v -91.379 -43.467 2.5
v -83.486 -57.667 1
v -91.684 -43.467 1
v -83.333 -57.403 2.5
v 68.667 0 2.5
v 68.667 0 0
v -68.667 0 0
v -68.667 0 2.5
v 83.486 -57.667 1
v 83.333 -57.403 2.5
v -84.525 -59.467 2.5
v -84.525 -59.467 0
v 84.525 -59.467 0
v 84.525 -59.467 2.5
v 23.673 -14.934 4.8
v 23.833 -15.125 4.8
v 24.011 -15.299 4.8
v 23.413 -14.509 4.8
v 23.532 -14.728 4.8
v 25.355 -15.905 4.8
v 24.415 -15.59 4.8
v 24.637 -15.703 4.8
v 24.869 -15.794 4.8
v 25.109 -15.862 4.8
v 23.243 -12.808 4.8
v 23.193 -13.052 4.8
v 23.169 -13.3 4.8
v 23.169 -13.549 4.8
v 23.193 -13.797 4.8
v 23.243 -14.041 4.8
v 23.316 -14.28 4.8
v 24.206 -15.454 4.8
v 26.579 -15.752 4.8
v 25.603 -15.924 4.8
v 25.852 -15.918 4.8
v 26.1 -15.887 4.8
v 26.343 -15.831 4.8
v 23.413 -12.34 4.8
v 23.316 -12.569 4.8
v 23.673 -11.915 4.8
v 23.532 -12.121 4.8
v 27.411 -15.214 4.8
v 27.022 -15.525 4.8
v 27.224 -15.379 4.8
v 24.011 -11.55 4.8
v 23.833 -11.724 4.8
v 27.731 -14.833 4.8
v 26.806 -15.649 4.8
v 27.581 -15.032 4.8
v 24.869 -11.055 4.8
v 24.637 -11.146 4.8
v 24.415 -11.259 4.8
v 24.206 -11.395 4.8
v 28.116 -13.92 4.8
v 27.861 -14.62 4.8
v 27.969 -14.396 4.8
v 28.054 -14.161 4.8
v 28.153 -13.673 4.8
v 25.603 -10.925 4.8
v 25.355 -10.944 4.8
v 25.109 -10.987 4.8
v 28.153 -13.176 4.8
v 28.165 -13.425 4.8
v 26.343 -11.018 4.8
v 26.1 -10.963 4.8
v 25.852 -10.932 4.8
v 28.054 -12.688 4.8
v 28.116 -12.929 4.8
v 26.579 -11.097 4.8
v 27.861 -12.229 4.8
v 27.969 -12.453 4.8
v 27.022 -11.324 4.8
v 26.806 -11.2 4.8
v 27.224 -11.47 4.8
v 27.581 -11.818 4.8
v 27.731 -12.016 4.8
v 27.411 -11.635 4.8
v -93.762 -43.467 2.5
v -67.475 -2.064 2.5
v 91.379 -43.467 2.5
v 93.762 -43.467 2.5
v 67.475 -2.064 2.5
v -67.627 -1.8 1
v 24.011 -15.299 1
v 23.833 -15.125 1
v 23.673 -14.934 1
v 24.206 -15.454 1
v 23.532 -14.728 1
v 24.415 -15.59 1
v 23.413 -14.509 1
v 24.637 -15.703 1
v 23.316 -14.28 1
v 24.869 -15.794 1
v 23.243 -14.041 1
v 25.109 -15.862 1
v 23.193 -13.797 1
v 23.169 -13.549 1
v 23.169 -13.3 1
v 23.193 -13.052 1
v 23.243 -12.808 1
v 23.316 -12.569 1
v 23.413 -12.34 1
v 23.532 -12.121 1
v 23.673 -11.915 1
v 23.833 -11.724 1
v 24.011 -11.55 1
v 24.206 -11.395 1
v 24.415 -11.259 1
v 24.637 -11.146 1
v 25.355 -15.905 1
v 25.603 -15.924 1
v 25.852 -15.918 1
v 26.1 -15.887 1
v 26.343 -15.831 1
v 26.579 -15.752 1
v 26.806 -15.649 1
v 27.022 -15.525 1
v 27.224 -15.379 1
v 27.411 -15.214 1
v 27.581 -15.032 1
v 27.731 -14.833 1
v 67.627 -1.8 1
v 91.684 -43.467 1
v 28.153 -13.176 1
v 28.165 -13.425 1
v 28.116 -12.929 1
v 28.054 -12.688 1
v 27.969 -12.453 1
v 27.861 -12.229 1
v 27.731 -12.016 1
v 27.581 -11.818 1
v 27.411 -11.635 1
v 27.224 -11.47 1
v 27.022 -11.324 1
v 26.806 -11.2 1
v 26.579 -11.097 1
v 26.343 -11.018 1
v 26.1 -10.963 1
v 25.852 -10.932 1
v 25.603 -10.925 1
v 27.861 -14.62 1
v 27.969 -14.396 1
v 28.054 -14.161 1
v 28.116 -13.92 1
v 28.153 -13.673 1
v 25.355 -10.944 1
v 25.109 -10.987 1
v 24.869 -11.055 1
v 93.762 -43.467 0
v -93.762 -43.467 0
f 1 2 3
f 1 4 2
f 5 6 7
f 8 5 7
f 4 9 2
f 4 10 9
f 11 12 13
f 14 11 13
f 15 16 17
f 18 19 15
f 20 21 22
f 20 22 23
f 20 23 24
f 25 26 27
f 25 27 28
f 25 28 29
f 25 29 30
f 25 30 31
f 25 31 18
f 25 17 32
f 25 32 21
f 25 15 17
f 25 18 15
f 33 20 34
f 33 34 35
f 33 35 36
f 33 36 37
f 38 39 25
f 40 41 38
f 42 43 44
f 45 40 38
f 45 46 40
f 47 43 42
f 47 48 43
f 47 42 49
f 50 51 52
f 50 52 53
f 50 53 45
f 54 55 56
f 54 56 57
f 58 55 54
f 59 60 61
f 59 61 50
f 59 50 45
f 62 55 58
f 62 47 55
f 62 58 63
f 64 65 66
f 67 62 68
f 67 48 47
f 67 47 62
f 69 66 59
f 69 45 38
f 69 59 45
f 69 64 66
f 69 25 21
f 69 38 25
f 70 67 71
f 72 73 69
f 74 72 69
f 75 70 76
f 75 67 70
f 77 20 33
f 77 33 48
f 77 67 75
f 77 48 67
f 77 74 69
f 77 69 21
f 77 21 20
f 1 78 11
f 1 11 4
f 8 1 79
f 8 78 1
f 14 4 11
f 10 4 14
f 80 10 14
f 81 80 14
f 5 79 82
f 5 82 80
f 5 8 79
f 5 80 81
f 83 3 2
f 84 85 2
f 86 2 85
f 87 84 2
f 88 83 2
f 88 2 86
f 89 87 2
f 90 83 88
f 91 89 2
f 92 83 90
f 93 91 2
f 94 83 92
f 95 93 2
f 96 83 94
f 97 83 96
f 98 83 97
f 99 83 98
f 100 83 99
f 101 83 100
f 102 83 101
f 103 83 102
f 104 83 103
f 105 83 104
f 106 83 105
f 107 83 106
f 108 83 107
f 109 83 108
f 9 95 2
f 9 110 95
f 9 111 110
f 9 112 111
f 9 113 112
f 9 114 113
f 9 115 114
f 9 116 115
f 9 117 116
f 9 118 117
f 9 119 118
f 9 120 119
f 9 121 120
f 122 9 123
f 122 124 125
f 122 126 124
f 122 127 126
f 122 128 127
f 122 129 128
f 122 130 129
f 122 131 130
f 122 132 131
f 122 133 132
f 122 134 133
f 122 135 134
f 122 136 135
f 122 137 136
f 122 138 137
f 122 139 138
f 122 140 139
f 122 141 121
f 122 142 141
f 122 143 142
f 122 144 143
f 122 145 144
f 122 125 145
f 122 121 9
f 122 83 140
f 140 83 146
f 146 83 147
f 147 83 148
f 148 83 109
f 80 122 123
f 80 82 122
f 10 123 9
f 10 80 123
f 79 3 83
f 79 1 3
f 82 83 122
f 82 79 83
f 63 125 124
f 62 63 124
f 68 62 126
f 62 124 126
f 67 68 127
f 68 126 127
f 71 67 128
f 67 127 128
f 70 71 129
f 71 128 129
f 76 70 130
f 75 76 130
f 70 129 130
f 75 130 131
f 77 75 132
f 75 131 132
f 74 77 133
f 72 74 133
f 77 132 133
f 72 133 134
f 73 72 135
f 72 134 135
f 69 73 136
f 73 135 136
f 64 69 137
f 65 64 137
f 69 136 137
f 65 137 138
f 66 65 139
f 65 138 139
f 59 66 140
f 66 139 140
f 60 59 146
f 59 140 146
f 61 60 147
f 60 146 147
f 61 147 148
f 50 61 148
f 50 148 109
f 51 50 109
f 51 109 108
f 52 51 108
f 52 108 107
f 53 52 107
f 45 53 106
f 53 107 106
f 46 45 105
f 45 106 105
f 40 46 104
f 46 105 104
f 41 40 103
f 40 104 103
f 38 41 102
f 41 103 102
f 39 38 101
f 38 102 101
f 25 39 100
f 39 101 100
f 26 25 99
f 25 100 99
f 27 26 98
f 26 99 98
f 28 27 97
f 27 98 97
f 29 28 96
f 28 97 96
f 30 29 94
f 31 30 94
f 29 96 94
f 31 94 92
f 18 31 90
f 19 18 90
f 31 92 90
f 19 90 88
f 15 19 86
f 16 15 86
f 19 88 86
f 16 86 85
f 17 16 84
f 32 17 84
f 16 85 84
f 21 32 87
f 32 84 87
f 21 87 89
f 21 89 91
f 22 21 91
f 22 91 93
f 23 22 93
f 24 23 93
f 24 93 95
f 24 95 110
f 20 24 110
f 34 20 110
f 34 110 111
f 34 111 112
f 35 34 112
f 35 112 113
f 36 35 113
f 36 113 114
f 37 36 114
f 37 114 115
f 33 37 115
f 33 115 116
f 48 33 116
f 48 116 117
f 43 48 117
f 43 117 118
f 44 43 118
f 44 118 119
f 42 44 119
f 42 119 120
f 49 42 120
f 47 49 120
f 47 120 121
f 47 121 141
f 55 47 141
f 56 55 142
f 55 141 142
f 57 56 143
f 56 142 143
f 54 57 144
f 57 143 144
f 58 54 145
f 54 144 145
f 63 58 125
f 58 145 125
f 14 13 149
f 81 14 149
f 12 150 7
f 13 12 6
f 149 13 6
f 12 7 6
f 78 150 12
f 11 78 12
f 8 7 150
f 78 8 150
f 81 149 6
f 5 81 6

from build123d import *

# Parameters (mm, degrees)
BOSS_EXTRU_1_DEPTH              = 1
EXTRU_MINCE1_DEPTH              = 1.5
EXTRU_MINCE1_TAPER              = -10
ENL_V_DE_MAT_EXTRU_MINCE1_DEPTH = 3.5000001
ESQUISSE4_R                     = 2.5
BOSS_EXTRU_2_DEPTH              = 3.8


with BuildPart() as part:
    # Esquisse1 → Boss.-Extru.1 (new body)
    with BuildSketch(Plane.XY):
        Polygon((-84.524791386, -59.467077727), (2.7, -59.467077727), (84.524791386, -59.467077727), (93.762395693, -43.467077727), (68.666666667, 0), (-68.666666667, 0), (-93.762395693, -43.467077727), align=None)
    extrude(amount=BOSS_EXTRU_1_DEPTH)

    # Esquisse2 → Extru.-Mince1 (add)
    with BuildSketch(Plane.XY.offset(1)):
        Polygon((-93.762395693, -43.467077727), (-84.524791386, -59.467077727), (84.524791386, -59.467077727), (93.762395693, -43.467077727), (68.666666667, 0), (-68.666666667, 0), align=None)
        Polygon((-91.683934724, -43.467077727), (-83.485560901, -57.667077727), (83.485560901, -57.667077727), (91.683934724, -43.467077727), (67.627436182, -1.8), (-67.627436182, -1.8), align=None, mode=Mode.SUBTRACT)
    extrude(amount=EXTRU_MINCE1_DEPTH, taper=EXTRU_MINCE1_TAPER)

    # Esquisse3 → Enlèv. de mat.-Extru.-Mince1 (cut, through all)
    with BuildSketch(Plane(origin=(0, 0, 0), x_dir=(-1, 0, 0), z_dir=(0, 0, -1))):
        Polygon((85.621756897, -61.367077727), (95.956326716, -43.467077727), (69.763632178, 1.9), (-69.763632178, 1.9), (-95.956326716, -43.467077727), (-85.621756897, -61.367077727), align=None)
        Polygon((84.524791386, -59.467077727), (93.762395693, -43.467077727), (68.666666667, 0), (-68.666666667, 0), (-93.762395693, -43.467077727), (-84.524791386, -59.467077727), align=None, mode=Mode.SUBTRACT)
    extrude(amount=-ENL_V_DE_MAT_EXTRU_MINCE1_DEPTH, mode=Mode.SUBTRACT)

    # Esquisse4 → Boss.-Extru.2 (add)
    with BuildSketch(Plane.XY.offset(1)):
        with Locations((25.665479371, -13.424541306)):
            Circle(ESQUISSE4_R)
    extrude(amount=BOSS_EXTRU_2_DEPTH)


solid = part.part
